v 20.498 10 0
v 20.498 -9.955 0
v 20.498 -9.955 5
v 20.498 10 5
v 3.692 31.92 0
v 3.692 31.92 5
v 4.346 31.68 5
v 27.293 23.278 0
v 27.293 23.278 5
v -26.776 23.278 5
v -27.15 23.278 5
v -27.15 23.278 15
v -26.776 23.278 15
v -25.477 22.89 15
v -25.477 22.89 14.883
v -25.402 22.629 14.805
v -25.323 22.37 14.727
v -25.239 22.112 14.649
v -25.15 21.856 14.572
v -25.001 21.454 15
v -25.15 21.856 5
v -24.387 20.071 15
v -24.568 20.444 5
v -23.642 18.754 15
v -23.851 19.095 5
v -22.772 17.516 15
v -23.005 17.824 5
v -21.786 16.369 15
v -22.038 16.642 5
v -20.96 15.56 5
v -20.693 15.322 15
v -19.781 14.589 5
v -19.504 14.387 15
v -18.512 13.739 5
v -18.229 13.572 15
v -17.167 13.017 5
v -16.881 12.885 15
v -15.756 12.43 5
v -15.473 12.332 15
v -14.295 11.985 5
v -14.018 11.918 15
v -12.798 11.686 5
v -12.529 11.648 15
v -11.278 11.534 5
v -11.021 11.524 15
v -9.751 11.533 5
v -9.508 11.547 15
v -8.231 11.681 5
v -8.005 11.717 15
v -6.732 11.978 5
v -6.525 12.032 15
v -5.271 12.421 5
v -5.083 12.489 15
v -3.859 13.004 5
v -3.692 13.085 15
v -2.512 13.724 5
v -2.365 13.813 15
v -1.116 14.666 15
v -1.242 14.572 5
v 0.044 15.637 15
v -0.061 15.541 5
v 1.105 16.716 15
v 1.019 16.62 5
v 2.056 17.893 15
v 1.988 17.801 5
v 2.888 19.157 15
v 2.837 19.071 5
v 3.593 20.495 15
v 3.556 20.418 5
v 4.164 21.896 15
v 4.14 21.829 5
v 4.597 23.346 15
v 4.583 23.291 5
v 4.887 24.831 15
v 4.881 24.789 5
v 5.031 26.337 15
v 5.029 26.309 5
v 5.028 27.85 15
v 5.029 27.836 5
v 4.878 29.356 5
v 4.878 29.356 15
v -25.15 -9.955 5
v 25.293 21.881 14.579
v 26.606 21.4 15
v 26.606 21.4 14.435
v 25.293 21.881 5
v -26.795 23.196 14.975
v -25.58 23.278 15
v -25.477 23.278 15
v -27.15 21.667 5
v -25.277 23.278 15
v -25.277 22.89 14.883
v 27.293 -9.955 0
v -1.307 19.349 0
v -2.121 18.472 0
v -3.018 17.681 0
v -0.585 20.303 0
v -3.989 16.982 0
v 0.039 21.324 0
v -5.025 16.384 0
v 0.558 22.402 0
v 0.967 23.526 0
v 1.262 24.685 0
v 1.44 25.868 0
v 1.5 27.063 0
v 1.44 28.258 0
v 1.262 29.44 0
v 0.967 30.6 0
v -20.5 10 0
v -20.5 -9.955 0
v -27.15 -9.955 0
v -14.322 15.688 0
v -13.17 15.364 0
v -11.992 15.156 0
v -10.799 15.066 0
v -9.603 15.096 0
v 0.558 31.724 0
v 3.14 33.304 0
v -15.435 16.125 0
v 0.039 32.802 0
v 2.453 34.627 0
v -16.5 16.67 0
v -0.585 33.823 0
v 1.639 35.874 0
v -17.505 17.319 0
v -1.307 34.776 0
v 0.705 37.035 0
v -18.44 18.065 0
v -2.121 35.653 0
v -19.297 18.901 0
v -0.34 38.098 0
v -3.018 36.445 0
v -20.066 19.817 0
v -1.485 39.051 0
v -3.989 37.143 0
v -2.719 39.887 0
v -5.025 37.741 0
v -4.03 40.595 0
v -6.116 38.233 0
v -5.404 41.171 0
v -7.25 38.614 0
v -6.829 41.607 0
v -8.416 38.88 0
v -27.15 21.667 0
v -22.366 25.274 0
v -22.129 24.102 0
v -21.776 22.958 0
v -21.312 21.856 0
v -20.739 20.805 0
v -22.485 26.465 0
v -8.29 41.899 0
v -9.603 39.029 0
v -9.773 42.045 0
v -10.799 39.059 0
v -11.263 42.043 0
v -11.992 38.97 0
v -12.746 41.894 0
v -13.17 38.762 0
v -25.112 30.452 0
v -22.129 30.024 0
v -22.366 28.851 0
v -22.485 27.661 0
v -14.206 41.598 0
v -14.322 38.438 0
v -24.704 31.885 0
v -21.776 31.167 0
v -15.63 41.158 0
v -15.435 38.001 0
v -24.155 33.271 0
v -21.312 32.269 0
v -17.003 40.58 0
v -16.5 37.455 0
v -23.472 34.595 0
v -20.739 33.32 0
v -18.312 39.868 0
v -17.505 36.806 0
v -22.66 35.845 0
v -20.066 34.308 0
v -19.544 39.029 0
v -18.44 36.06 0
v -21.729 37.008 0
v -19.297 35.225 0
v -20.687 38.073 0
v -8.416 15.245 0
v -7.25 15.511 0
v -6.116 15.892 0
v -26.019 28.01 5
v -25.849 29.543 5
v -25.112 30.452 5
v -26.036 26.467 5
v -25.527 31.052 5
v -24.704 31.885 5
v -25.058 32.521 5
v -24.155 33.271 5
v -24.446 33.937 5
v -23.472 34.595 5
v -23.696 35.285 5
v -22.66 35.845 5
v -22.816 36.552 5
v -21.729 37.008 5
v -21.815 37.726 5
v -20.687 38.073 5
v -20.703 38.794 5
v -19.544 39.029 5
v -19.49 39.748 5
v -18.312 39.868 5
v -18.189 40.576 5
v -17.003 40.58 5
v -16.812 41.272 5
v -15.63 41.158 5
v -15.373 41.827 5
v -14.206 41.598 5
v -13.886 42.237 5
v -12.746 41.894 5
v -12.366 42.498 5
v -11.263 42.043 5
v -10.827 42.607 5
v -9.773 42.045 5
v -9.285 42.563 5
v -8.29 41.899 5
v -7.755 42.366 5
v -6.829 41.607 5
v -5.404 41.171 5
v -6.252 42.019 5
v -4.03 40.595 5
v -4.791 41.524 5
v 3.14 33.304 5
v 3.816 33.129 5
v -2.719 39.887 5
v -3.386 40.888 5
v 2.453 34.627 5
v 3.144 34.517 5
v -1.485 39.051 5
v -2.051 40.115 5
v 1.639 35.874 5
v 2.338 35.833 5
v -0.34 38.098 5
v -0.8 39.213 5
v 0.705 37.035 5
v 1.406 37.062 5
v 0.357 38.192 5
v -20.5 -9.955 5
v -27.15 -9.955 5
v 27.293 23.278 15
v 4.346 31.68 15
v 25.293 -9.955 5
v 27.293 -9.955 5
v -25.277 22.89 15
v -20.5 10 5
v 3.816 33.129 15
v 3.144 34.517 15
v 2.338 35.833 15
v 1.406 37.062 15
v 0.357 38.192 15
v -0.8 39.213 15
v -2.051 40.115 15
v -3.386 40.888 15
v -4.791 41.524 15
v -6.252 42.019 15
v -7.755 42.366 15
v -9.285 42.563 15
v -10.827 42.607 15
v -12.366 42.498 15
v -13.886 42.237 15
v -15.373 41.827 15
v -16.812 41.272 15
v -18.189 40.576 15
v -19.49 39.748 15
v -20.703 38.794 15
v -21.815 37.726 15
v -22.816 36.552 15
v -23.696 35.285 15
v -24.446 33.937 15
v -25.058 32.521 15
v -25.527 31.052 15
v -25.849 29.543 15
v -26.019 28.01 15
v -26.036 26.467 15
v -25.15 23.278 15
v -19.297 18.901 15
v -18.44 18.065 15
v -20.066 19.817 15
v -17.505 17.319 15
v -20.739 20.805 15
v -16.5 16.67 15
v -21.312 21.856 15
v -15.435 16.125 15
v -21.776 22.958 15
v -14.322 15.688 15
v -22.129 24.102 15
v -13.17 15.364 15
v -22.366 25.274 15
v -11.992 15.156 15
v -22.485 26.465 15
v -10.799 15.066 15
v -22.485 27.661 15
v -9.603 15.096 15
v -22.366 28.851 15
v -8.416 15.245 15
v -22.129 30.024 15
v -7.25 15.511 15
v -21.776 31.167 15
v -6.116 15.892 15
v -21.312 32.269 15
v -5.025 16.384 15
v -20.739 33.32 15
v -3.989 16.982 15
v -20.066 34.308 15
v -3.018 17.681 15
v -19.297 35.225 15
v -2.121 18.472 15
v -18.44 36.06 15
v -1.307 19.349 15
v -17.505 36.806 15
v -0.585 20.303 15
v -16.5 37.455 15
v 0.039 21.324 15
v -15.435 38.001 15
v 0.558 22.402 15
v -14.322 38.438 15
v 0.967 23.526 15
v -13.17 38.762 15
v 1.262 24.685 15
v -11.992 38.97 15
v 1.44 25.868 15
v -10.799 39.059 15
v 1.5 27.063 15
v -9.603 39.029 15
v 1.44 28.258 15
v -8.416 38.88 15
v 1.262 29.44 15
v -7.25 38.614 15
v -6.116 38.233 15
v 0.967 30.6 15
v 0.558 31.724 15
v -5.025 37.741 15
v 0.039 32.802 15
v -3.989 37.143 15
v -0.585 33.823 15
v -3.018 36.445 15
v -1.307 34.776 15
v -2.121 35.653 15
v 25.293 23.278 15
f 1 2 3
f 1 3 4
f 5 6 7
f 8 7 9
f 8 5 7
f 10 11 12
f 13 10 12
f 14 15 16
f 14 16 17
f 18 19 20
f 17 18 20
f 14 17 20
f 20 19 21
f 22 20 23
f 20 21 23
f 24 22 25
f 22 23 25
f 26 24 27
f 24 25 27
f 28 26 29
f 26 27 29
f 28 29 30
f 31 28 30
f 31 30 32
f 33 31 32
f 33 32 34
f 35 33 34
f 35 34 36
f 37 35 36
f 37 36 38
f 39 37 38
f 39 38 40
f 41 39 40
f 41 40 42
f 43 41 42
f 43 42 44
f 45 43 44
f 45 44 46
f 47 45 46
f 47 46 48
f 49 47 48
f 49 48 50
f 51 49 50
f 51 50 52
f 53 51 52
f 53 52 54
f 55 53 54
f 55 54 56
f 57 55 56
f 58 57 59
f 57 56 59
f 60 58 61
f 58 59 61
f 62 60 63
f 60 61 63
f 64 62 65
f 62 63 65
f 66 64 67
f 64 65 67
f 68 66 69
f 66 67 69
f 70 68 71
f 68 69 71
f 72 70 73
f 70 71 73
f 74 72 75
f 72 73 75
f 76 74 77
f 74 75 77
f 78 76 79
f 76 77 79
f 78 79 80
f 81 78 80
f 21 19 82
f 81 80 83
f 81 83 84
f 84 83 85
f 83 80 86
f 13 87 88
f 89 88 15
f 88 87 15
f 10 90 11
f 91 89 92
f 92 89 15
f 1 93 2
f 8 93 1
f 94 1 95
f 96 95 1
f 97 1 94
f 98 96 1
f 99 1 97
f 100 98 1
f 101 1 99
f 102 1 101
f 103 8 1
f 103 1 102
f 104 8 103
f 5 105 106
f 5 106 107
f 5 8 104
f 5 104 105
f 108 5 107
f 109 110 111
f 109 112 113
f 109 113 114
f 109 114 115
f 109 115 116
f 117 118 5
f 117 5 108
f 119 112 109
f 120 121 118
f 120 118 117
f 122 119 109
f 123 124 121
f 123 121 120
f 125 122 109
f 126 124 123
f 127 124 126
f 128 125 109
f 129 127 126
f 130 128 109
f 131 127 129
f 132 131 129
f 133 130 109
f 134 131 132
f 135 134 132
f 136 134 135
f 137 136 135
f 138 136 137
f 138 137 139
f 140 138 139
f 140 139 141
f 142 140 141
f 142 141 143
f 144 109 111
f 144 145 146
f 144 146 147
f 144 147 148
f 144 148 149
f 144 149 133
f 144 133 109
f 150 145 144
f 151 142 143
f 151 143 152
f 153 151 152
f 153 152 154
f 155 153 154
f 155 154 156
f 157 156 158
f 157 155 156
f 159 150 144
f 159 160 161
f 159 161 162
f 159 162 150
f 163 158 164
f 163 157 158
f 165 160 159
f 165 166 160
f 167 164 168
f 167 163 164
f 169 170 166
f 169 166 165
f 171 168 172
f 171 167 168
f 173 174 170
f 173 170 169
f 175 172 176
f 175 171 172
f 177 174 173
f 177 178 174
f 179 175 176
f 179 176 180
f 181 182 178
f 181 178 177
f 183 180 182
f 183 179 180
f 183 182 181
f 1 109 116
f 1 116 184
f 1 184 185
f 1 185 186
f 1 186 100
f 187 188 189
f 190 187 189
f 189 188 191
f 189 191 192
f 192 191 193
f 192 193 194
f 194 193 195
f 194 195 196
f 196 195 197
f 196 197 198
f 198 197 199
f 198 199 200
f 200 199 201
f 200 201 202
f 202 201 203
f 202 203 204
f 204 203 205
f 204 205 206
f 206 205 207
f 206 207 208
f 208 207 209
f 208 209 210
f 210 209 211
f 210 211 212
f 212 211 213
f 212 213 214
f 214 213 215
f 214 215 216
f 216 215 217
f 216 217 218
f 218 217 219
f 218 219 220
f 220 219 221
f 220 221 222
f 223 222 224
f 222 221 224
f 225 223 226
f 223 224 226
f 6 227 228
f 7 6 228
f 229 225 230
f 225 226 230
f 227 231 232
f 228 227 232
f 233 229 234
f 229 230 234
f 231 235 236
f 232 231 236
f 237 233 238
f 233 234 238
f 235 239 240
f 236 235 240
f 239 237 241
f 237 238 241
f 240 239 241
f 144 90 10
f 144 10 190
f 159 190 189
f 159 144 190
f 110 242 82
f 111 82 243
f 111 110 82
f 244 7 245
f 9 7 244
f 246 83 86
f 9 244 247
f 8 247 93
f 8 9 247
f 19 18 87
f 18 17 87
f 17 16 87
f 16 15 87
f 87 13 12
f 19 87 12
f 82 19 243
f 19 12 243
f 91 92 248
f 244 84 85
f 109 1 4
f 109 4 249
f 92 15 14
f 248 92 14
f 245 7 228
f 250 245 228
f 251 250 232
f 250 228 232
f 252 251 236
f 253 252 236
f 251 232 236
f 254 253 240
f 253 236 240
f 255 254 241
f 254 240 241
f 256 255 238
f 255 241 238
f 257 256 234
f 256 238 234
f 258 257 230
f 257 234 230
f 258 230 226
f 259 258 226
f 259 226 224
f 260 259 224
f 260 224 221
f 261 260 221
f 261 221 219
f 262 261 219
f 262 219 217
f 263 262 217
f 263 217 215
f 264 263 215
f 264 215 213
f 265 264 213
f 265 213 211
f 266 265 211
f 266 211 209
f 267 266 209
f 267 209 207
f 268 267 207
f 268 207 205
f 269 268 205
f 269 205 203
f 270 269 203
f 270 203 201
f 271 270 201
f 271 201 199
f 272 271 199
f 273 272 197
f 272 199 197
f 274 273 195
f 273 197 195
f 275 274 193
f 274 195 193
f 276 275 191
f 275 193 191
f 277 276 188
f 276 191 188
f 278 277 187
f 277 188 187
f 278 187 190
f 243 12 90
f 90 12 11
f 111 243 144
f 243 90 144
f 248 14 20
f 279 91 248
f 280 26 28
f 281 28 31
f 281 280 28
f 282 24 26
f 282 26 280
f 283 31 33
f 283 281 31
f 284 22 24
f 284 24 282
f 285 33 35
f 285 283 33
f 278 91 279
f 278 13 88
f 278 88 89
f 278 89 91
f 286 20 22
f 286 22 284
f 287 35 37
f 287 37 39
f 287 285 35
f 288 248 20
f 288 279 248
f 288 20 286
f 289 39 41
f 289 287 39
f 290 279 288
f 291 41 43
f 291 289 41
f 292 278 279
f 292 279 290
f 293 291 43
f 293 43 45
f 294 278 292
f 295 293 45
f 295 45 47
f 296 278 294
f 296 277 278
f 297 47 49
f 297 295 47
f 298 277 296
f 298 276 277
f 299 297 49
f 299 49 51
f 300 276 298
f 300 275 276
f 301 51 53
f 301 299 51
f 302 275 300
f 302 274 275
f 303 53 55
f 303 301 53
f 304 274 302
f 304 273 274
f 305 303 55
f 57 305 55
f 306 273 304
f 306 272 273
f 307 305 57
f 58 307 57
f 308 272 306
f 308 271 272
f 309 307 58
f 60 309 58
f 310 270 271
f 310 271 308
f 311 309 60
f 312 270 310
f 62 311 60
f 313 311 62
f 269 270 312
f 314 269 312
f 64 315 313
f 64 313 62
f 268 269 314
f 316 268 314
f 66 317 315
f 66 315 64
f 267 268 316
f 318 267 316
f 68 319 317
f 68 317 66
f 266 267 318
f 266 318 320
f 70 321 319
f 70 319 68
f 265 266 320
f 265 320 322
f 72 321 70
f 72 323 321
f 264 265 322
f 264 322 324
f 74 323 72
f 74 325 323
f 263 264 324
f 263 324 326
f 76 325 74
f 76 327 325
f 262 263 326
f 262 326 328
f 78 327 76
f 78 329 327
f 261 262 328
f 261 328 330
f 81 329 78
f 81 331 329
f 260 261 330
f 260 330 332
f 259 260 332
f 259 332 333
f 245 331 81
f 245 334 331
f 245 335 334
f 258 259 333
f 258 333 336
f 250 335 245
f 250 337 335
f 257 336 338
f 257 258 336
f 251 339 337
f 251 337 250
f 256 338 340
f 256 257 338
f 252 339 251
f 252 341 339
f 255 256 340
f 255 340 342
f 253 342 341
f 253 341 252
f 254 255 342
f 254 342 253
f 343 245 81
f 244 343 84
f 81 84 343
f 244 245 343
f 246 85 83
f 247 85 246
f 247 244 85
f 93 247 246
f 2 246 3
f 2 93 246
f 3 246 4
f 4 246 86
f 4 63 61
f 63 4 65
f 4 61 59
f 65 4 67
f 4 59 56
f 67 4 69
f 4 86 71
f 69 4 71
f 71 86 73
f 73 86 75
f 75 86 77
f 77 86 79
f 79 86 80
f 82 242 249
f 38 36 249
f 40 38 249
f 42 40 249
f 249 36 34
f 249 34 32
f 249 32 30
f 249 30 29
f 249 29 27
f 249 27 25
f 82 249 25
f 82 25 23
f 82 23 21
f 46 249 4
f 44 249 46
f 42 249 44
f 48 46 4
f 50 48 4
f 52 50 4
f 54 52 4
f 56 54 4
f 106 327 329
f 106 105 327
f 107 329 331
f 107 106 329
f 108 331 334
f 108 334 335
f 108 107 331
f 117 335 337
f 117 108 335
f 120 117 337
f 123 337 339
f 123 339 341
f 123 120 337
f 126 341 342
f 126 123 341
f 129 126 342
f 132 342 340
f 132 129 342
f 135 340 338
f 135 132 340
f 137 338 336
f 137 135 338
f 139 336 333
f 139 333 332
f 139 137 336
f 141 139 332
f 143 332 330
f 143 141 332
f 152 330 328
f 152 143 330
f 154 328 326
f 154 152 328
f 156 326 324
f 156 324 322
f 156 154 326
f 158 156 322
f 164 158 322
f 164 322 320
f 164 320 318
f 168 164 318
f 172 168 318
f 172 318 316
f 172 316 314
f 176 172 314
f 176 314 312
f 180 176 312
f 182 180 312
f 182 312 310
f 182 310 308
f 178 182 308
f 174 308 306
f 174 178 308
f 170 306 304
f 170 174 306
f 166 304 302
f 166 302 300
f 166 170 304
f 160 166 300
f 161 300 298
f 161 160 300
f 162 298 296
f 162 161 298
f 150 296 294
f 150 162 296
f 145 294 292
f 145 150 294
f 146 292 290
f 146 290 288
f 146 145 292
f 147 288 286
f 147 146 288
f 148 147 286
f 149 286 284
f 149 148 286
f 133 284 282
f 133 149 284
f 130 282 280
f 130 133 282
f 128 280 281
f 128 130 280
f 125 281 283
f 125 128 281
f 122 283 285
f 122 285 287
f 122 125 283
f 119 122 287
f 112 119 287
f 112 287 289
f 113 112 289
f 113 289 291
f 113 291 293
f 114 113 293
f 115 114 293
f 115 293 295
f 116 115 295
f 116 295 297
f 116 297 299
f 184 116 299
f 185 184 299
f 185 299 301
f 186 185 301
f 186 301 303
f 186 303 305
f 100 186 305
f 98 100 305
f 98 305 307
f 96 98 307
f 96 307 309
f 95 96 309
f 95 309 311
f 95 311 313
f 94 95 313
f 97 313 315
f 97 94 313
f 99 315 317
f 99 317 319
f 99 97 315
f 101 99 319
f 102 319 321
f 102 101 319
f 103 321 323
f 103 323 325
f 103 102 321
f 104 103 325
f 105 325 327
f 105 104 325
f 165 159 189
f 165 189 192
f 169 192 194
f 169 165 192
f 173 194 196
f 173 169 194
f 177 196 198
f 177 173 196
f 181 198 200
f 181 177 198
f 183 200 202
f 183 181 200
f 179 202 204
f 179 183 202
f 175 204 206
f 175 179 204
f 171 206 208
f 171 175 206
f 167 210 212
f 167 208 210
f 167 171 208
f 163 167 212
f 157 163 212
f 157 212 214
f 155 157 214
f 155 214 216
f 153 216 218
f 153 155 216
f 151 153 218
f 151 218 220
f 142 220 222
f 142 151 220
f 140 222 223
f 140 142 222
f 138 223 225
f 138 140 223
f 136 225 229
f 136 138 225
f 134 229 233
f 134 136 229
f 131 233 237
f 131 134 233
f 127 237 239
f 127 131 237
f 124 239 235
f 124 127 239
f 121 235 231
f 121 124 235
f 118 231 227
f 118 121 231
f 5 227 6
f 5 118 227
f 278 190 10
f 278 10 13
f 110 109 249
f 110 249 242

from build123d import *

# Parameters (mm, degrees)
SKETCH1_R           = 12
BOSS_EXTRUDE1_DEPTH = 5
BOSS_EXTRUDE2_DEPTH = 2
BOSS_EXTRUDE3_DEPTH = 2
SKETCH4_R           = 15.547757557
SKETCH4_R_2         = 12
BOSS_EXTRUDE4_DEPTH = 10
SKETCH5_W           = 10
SKETCH5_H           = 9.018962752
BOSS_EXTRUDE5_DEPTH = 2
SKETCH6_W           = 25.14370714
SKETCH6_H           = 10
BOSS_EXTRUDE6_DEPTH = 2
CUT_EXTRUDE1_DEPTH  = 2
CUT_EXTRUDE2_DEPTH  = 0.2


with BuildPart() as part:
    # Sketch1 → Boss-Extrude1 (new body)
    with BuildSketch(Plane.XY):
        with BuildLine():
            Line((-27.15, 21.666502105), (-25.112032094, 30.452193651))
            ThreePointArc((-25.112032094, 30.452193651), (-11.263369735, 42.043284959), (3.691801624, 31.919960581))
            Line((3.691801624, 31.919960581), (27.293258902, 23.278095711))
            Line((27.293258902, 23.278095711), (27.293258902, 10))
            Line((27.293258902, 10), (27.293258902, -9.955183239))
            Line((27.293258902, -9.955183239), (20.497693749, -9.955183239))
            Line((20.497693749, -9.955183239), (20.497693749, 10))
            Line((20.497693749, 10), (-20.5, 10))
            Line((-20.5, 10), (-20.5, -9.955183239))
            Line((-20.5, -9.955183239), (-27.15, -9.955183239))
            Line((-27.15, -9.955183239), (-27.15, 10))
            Line((-27.15, 10), (-27.15, 21.666502105))
        make_face()
        with Locations((-10.5, 27.062721997)):
            Circle(SKETCH1_R, mode=Mode.SUBTRACT)
    extrude(amount=BOSS_EXTRUDE1_DEPTH)

    # Sketch2 → Boss-Extrude2 (add)
    with BuildSketch(Plane(origin=(27.293258902, 0, 0), x_dir=(0, 0, -1), z_dir=(1, 0, 0))):
        Polygon((-5, -9.955183239), (-5, 23.278095711), (-15, 23.278095711), align=None)
    extrude(amount=-BOSS_EXTRUDE2_DEPTH)

    # Sketch3 → Boss-Extrude3 (add)
    with BuildSketch(Plane.ZY.offset(27.15)):
        Polygon((5, -9.955183239), (5, 23.278095711), (15, 23.278095711), align=None)
    extrude(amount=-BOSS_EXTRUDE3_DEPTH)

    # Sketch4 → Boss-Extrude4 (add)
    with BuildSketch(Plane.XY.offset(5)):
        with Locations((-10.5, 27.062721997)):
            Circle(SKETCH4_R)
        with Locations((-10.5, 27.062721997)):
            Circle(SKETCH4_R_2, mode=Mode.SUBTRACT)
    extrude(amount=BOSS_EXTRUDE4_DEPTH)

    # Sketch5 → Boss-Extrude5 (add)
    with BuildSketch(Plane(origin=(-30.532955865, 7.082559615, 0), x_dir=(0, 0, 1), z_dir=(-0.9741354729183627, 0.22596477690586622, 0))):
        with Locations((10, 21.050556457)):
            Rectangle(SKETCH5_W, SKETCH5_H)
    extrude(amount=-BOSS_EXTRUDE5_DEPTH)

    # Sketch6 → Boss-Extrude6 (add)
    with BuildSketch(Plane(origin=(10.742458336, 29.338305481, 0), x_dir=(0.9390305732894374, -0.34383365517021547, 0), z_dir=(0.34383365517021547, 0.9390305732894374, 0))):
        with Locations((5.053558251, -10)):
            Rectangle(SKETCH6_W, SKETCH6_H)
    extrude(amount=-BOSS_EXTRUDE6_DEPTH)

    # Sketch7 → Cut-Extrude1 (cut, along a direction that is not the sketch's normal)
    with BuildSketch(Plane(origin=(3.73770034, 16.113247996, 0), x_dir=(0.9741354729183627, -0.22596477690586628, -2.8423494966508805e-14), z_dir=(-0.2259647769058663, -0.9741354729183628, -1.225338527992233e-13))):
        Polygon((-29.99078277, 15), (-31.343644404, 15), (-31.343644404, 14.975239248), (-29.99078277, 14.883253417), align=None)
    extrude(amount=-CUT_EXTRUDE1_DEPTH, dir=(2.329279663418559e-14, -0.9575879123587351, -0.2881412676178814), mode=Mode.SUBTRACT)

    # Sketch8 → Cut-Extrude2 (cut)
    with BuildSketch(Plane.ZY.offset(25.477385016)):
        Polygon((15, 22.890108534), (15, 23.278095711), (14.883253417, 22.890108534), align=None)
    extrude(amount=-CUT_EXTRUDE2_DEPTH, mode=Mode.SUBTRACT)


solid = part.part
